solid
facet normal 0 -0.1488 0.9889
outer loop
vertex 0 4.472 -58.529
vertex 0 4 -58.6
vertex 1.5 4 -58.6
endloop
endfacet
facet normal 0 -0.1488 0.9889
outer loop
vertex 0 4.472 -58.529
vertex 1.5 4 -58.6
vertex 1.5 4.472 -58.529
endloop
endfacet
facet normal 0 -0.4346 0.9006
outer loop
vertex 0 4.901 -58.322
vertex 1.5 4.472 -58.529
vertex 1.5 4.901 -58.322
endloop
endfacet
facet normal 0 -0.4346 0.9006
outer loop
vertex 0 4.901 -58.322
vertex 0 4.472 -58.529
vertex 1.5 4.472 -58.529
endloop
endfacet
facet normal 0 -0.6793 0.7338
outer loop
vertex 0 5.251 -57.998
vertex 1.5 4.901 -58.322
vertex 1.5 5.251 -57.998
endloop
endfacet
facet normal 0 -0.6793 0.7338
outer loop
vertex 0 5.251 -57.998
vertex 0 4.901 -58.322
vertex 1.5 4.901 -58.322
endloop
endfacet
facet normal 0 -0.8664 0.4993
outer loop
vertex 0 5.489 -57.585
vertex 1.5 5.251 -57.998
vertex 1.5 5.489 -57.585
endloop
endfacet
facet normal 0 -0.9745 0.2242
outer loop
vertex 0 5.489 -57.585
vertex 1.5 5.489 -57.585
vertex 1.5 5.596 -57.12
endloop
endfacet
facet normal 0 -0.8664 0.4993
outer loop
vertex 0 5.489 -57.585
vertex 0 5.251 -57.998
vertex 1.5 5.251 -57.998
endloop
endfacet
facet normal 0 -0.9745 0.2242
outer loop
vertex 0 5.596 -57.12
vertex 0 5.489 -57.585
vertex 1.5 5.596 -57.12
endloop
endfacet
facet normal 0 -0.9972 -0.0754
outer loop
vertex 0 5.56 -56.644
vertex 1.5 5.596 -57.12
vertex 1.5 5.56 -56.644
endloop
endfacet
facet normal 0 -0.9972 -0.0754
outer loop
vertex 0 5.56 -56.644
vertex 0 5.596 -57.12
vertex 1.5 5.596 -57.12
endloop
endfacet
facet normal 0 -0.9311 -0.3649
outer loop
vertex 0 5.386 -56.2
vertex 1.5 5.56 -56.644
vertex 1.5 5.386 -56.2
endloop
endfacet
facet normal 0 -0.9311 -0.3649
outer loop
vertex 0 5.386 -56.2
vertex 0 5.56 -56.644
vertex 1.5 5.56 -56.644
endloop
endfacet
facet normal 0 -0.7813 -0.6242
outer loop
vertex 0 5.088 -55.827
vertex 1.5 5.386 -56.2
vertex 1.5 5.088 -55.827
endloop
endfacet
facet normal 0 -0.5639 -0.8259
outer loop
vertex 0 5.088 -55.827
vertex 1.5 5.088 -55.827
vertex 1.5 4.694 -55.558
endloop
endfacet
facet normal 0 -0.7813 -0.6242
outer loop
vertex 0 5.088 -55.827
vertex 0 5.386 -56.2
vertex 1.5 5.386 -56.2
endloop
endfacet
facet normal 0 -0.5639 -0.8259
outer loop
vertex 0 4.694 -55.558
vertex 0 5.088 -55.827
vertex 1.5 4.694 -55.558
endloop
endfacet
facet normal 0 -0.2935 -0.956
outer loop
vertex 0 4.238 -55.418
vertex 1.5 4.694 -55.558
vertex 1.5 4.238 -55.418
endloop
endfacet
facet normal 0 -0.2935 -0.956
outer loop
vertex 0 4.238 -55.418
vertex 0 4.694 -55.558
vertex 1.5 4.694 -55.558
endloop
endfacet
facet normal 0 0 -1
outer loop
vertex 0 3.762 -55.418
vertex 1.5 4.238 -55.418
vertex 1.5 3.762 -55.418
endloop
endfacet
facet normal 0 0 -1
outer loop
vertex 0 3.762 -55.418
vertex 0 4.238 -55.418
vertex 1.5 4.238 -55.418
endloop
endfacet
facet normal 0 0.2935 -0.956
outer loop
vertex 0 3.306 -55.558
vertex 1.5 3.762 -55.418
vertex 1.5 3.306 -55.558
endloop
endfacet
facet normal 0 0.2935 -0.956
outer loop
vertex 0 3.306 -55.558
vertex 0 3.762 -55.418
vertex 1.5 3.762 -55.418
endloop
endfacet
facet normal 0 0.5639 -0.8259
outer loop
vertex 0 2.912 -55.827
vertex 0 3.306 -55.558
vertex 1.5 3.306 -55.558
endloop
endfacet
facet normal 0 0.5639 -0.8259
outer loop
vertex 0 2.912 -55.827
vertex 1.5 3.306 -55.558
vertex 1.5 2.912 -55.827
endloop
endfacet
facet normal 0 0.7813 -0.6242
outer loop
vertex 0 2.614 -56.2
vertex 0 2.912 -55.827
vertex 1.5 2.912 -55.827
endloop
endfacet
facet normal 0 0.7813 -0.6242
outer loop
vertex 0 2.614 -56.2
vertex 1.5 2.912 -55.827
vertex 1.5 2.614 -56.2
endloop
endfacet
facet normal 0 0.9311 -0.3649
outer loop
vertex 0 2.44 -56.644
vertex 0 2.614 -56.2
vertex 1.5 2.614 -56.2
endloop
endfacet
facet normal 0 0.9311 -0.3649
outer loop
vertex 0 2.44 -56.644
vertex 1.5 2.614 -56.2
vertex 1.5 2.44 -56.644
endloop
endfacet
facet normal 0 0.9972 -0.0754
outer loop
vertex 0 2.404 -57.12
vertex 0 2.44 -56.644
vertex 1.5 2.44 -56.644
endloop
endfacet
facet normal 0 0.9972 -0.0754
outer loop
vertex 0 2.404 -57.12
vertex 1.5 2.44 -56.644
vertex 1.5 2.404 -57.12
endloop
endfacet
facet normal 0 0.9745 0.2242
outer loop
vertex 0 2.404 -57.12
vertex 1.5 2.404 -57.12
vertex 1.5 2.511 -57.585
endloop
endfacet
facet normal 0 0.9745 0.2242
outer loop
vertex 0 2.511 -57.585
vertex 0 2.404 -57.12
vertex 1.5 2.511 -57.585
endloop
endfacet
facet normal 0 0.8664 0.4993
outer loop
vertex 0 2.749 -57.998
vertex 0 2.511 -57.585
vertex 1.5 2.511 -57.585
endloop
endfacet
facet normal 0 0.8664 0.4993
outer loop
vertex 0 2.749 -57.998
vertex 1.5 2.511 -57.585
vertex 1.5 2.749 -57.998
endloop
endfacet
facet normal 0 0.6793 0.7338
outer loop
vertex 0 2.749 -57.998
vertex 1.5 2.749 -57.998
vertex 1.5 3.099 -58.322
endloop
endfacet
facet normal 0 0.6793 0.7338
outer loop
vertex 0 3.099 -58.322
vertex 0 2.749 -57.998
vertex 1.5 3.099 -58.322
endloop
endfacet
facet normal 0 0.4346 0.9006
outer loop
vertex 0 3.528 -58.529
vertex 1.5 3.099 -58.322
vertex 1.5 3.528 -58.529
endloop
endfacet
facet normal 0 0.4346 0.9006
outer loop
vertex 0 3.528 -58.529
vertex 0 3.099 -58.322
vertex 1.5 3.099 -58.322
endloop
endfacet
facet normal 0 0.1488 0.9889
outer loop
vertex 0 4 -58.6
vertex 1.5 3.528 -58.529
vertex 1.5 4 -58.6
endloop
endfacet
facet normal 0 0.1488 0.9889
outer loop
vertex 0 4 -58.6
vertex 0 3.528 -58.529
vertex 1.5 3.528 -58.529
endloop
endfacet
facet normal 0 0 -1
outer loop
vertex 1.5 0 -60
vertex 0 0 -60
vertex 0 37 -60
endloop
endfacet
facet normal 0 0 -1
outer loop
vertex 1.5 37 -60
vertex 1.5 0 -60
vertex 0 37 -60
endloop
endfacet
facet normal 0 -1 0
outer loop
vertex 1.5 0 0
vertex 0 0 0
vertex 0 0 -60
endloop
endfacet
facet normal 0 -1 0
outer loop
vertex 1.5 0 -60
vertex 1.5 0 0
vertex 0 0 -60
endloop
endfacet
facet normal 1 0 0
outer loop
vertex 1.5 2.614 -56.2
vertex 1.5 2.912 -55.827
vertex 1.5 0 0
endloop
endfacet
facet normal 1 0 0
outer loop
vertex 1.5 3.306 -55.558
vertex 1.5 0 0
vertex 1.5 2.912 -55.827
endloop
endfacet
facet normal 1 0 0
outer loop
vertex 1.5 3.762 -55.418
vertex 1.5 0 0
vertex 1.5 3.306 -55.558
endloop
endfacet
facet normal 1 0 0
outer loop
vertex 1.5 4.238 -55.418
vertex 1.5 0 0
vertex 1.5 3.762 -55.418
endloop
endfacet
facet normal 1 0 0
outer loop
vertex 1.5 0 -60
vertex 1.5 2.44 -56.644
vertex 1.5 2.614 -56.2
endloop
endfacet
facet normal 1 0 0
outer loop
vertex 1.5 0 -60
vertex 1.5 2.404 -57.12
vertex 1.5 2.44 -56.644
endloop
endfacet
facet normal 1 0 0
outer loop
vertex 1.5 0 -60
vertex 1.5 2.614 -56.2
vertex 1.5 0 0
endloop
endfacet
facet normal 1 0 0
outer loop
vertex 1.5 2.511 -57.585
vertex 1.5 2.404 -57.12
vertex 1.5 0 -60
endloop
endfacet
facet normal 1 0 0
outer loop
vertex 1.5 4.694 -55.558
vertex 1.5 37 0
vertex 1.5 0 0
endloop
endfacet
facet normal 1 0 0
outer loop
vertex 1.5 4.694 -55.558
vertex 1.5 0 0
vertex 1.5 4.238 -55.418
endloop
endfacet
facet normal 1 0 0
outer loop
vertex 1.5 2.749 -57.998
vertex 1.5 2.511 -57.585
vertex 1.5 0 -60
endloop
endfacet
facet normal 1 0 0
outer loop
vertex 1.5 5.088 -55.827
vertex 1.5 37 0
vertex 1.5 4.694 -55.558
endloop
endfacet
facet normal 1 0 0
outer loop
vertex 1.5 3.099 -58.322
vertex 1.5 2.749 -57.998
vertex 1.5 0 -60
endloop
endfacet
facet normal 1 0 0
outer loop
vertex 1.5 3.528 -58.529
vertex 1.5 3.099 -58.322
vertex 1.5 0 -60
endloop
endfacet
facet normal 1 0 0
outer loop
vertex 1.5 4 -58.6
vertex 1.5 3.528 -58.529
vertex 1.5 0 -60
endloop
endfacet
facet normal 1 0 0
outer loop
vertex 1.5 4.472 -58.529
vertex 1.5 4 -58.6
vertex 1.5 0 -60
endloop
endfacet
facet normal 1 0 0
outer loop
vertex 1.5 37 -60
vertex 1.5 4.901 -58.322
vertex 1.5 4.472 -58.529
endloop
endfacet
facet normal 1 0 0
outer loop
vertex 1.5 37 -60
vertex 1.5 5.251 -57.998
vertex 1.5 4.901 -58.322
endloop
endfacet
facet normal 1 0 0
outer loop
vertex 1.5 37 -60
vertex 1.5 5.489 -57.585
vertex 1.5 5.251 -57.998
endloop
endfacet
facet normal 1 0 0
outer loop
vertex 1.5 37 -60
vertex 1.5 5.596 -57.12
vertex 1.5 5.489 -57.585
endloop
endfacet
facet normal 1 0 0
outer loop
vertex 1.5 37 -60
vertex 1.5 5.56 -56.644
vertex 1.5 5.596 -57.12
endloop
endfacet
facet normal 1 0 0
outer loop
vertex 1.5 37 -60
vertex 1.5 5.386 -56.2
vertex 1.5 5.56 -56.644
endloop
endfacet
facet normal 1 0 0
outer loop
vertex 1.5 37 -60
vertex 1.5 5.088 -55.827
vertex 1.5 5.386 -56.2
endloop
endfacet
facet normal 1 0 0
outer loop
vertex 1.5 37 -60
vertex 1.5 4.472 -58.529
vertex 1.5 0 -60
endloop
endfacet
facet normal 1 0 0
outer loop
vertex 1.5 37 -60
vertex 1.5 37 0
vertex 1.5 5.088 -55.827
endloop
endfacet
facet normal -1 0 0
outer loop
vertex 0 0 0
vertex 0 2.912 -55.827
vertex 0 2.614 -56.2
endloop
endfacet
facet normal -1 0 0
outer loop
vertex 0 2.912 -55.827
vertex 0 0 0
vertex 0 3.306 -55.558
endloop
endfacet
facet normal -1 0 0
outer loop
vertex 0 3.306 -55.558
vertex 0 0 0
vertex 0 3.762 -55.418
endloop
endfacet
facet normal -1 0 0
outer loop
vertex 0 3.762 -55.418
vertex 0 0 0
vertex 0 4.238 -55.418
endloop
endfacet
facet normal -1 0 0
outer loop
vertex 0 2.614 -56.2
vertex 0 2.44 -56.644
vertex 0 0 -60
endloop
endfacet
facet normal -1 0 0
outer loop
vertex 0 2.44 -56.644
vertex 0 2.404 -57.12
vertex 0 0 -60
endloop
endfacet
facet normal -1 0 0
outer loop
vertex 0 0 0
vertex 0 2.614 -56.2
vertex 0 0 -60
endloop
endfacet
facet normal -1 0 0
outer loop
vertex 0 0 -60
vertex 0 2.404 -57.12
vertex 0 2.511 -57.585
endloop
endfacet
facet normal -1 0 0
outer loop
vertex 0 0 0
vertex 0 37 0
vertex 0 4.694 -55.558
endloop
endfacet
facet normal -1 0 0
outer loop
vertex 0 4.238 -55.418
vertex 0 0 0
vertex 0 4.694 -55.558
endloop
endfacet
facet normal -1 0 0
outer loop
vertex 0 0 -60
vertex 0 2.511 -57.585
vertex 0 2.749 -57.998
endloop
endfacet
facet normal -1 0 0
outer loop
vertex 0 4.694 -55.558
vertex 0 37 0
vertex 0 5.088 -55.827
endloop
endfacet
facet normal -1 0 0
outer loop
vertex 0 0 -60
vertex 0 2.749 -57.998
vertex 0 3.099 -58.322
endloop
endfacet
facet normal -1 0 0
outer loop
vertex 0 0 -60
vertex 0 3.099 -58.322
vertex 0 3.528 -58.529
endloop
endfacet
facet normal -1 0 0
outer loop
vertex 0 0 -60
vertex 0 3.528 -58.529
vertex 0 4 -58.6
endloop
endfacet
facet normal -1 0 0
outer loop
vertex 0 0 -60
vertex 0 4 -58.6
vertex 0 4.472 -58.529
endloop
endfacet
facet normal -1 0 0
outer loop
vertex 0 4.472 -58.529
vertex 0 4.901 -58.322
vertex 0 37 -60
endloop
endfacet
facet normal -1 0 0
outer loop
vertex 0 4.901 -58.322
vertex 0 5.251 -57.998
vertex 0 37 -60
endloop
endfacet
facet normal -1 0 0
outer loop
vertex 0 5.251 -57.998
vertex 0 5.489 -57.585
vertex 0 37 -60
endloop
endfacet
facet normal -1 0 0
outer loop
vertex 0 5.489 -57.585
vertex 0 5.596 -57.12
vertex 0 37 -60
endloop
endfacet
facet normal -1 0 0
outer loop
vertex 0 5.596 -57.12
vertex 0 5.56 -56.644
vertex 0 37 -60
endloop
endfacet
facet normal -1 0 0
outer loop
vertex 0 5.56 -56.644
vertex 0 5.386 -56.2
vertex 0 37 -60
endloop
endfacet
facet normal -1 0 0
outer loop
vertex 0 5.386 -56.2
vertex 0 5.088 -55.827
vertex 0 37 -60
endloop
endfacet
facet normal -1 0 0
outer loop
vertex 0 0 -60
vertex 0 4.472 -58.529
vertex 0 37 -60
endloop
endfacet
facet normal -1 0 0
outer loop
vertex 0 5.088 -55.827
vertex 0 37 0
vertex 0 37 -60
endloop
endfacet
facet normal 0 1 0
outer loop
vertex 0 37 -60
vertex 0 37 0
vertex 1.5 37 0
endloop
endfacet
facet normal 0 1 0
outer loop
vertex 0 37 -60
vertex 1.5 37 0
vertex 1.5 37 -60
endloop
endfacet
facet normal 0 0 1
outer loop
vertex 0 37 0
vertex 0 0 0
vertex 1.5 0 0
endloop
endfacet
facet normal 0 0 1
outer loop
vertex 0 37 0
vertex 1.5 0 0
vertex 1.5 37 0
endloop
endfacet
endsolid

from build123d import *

# Parameters (mm, degrees)
SKETCH_1_W      = 60
SKETCH_1_H      = 37
SKETCH_1_R      = 1.6
EXTRUDE_1_DEPTH = 1.5


with BuildPart() as part:
    # Эскиз1 → Бобышка-Вытянуть1 (new body)
    with BuildSketch(Plane(origin=(0, 0, 0), x_dir=(0, 0, -1), z_dir=(1, 0, 0))):
        with Locations((30, 18.5)):
            Rectangle(SKETCH_1_W, SKETCH_1_H)
        with Locations((3, 4)):
            Circle(SKETCH_1_R, mode=Mode.SUBTRACT)
        with Locations((57, 4)):
            Circle(SKETCH_1_R, mode=Mode.SUBTRACT)
        with Locations((57, 34)):
            Circle(SKETCH_1_R, mode=Mode.SUBTRACT)
        with Locations((3, 34)):
            Circle(SKETCH_1_R, mode=Mode.SUBTRACT)
        with Locations((3, 34)):
            Circle(SKETCH_1_R)
        with Locations((3, 4)):
            Circle(SKETCH_1_R)
        with Locations((57, 34)):
            Circle(SKETCH_1_R)
    extrude(amount=EXTRUDE_1_DEPTH)


solid = part.part
